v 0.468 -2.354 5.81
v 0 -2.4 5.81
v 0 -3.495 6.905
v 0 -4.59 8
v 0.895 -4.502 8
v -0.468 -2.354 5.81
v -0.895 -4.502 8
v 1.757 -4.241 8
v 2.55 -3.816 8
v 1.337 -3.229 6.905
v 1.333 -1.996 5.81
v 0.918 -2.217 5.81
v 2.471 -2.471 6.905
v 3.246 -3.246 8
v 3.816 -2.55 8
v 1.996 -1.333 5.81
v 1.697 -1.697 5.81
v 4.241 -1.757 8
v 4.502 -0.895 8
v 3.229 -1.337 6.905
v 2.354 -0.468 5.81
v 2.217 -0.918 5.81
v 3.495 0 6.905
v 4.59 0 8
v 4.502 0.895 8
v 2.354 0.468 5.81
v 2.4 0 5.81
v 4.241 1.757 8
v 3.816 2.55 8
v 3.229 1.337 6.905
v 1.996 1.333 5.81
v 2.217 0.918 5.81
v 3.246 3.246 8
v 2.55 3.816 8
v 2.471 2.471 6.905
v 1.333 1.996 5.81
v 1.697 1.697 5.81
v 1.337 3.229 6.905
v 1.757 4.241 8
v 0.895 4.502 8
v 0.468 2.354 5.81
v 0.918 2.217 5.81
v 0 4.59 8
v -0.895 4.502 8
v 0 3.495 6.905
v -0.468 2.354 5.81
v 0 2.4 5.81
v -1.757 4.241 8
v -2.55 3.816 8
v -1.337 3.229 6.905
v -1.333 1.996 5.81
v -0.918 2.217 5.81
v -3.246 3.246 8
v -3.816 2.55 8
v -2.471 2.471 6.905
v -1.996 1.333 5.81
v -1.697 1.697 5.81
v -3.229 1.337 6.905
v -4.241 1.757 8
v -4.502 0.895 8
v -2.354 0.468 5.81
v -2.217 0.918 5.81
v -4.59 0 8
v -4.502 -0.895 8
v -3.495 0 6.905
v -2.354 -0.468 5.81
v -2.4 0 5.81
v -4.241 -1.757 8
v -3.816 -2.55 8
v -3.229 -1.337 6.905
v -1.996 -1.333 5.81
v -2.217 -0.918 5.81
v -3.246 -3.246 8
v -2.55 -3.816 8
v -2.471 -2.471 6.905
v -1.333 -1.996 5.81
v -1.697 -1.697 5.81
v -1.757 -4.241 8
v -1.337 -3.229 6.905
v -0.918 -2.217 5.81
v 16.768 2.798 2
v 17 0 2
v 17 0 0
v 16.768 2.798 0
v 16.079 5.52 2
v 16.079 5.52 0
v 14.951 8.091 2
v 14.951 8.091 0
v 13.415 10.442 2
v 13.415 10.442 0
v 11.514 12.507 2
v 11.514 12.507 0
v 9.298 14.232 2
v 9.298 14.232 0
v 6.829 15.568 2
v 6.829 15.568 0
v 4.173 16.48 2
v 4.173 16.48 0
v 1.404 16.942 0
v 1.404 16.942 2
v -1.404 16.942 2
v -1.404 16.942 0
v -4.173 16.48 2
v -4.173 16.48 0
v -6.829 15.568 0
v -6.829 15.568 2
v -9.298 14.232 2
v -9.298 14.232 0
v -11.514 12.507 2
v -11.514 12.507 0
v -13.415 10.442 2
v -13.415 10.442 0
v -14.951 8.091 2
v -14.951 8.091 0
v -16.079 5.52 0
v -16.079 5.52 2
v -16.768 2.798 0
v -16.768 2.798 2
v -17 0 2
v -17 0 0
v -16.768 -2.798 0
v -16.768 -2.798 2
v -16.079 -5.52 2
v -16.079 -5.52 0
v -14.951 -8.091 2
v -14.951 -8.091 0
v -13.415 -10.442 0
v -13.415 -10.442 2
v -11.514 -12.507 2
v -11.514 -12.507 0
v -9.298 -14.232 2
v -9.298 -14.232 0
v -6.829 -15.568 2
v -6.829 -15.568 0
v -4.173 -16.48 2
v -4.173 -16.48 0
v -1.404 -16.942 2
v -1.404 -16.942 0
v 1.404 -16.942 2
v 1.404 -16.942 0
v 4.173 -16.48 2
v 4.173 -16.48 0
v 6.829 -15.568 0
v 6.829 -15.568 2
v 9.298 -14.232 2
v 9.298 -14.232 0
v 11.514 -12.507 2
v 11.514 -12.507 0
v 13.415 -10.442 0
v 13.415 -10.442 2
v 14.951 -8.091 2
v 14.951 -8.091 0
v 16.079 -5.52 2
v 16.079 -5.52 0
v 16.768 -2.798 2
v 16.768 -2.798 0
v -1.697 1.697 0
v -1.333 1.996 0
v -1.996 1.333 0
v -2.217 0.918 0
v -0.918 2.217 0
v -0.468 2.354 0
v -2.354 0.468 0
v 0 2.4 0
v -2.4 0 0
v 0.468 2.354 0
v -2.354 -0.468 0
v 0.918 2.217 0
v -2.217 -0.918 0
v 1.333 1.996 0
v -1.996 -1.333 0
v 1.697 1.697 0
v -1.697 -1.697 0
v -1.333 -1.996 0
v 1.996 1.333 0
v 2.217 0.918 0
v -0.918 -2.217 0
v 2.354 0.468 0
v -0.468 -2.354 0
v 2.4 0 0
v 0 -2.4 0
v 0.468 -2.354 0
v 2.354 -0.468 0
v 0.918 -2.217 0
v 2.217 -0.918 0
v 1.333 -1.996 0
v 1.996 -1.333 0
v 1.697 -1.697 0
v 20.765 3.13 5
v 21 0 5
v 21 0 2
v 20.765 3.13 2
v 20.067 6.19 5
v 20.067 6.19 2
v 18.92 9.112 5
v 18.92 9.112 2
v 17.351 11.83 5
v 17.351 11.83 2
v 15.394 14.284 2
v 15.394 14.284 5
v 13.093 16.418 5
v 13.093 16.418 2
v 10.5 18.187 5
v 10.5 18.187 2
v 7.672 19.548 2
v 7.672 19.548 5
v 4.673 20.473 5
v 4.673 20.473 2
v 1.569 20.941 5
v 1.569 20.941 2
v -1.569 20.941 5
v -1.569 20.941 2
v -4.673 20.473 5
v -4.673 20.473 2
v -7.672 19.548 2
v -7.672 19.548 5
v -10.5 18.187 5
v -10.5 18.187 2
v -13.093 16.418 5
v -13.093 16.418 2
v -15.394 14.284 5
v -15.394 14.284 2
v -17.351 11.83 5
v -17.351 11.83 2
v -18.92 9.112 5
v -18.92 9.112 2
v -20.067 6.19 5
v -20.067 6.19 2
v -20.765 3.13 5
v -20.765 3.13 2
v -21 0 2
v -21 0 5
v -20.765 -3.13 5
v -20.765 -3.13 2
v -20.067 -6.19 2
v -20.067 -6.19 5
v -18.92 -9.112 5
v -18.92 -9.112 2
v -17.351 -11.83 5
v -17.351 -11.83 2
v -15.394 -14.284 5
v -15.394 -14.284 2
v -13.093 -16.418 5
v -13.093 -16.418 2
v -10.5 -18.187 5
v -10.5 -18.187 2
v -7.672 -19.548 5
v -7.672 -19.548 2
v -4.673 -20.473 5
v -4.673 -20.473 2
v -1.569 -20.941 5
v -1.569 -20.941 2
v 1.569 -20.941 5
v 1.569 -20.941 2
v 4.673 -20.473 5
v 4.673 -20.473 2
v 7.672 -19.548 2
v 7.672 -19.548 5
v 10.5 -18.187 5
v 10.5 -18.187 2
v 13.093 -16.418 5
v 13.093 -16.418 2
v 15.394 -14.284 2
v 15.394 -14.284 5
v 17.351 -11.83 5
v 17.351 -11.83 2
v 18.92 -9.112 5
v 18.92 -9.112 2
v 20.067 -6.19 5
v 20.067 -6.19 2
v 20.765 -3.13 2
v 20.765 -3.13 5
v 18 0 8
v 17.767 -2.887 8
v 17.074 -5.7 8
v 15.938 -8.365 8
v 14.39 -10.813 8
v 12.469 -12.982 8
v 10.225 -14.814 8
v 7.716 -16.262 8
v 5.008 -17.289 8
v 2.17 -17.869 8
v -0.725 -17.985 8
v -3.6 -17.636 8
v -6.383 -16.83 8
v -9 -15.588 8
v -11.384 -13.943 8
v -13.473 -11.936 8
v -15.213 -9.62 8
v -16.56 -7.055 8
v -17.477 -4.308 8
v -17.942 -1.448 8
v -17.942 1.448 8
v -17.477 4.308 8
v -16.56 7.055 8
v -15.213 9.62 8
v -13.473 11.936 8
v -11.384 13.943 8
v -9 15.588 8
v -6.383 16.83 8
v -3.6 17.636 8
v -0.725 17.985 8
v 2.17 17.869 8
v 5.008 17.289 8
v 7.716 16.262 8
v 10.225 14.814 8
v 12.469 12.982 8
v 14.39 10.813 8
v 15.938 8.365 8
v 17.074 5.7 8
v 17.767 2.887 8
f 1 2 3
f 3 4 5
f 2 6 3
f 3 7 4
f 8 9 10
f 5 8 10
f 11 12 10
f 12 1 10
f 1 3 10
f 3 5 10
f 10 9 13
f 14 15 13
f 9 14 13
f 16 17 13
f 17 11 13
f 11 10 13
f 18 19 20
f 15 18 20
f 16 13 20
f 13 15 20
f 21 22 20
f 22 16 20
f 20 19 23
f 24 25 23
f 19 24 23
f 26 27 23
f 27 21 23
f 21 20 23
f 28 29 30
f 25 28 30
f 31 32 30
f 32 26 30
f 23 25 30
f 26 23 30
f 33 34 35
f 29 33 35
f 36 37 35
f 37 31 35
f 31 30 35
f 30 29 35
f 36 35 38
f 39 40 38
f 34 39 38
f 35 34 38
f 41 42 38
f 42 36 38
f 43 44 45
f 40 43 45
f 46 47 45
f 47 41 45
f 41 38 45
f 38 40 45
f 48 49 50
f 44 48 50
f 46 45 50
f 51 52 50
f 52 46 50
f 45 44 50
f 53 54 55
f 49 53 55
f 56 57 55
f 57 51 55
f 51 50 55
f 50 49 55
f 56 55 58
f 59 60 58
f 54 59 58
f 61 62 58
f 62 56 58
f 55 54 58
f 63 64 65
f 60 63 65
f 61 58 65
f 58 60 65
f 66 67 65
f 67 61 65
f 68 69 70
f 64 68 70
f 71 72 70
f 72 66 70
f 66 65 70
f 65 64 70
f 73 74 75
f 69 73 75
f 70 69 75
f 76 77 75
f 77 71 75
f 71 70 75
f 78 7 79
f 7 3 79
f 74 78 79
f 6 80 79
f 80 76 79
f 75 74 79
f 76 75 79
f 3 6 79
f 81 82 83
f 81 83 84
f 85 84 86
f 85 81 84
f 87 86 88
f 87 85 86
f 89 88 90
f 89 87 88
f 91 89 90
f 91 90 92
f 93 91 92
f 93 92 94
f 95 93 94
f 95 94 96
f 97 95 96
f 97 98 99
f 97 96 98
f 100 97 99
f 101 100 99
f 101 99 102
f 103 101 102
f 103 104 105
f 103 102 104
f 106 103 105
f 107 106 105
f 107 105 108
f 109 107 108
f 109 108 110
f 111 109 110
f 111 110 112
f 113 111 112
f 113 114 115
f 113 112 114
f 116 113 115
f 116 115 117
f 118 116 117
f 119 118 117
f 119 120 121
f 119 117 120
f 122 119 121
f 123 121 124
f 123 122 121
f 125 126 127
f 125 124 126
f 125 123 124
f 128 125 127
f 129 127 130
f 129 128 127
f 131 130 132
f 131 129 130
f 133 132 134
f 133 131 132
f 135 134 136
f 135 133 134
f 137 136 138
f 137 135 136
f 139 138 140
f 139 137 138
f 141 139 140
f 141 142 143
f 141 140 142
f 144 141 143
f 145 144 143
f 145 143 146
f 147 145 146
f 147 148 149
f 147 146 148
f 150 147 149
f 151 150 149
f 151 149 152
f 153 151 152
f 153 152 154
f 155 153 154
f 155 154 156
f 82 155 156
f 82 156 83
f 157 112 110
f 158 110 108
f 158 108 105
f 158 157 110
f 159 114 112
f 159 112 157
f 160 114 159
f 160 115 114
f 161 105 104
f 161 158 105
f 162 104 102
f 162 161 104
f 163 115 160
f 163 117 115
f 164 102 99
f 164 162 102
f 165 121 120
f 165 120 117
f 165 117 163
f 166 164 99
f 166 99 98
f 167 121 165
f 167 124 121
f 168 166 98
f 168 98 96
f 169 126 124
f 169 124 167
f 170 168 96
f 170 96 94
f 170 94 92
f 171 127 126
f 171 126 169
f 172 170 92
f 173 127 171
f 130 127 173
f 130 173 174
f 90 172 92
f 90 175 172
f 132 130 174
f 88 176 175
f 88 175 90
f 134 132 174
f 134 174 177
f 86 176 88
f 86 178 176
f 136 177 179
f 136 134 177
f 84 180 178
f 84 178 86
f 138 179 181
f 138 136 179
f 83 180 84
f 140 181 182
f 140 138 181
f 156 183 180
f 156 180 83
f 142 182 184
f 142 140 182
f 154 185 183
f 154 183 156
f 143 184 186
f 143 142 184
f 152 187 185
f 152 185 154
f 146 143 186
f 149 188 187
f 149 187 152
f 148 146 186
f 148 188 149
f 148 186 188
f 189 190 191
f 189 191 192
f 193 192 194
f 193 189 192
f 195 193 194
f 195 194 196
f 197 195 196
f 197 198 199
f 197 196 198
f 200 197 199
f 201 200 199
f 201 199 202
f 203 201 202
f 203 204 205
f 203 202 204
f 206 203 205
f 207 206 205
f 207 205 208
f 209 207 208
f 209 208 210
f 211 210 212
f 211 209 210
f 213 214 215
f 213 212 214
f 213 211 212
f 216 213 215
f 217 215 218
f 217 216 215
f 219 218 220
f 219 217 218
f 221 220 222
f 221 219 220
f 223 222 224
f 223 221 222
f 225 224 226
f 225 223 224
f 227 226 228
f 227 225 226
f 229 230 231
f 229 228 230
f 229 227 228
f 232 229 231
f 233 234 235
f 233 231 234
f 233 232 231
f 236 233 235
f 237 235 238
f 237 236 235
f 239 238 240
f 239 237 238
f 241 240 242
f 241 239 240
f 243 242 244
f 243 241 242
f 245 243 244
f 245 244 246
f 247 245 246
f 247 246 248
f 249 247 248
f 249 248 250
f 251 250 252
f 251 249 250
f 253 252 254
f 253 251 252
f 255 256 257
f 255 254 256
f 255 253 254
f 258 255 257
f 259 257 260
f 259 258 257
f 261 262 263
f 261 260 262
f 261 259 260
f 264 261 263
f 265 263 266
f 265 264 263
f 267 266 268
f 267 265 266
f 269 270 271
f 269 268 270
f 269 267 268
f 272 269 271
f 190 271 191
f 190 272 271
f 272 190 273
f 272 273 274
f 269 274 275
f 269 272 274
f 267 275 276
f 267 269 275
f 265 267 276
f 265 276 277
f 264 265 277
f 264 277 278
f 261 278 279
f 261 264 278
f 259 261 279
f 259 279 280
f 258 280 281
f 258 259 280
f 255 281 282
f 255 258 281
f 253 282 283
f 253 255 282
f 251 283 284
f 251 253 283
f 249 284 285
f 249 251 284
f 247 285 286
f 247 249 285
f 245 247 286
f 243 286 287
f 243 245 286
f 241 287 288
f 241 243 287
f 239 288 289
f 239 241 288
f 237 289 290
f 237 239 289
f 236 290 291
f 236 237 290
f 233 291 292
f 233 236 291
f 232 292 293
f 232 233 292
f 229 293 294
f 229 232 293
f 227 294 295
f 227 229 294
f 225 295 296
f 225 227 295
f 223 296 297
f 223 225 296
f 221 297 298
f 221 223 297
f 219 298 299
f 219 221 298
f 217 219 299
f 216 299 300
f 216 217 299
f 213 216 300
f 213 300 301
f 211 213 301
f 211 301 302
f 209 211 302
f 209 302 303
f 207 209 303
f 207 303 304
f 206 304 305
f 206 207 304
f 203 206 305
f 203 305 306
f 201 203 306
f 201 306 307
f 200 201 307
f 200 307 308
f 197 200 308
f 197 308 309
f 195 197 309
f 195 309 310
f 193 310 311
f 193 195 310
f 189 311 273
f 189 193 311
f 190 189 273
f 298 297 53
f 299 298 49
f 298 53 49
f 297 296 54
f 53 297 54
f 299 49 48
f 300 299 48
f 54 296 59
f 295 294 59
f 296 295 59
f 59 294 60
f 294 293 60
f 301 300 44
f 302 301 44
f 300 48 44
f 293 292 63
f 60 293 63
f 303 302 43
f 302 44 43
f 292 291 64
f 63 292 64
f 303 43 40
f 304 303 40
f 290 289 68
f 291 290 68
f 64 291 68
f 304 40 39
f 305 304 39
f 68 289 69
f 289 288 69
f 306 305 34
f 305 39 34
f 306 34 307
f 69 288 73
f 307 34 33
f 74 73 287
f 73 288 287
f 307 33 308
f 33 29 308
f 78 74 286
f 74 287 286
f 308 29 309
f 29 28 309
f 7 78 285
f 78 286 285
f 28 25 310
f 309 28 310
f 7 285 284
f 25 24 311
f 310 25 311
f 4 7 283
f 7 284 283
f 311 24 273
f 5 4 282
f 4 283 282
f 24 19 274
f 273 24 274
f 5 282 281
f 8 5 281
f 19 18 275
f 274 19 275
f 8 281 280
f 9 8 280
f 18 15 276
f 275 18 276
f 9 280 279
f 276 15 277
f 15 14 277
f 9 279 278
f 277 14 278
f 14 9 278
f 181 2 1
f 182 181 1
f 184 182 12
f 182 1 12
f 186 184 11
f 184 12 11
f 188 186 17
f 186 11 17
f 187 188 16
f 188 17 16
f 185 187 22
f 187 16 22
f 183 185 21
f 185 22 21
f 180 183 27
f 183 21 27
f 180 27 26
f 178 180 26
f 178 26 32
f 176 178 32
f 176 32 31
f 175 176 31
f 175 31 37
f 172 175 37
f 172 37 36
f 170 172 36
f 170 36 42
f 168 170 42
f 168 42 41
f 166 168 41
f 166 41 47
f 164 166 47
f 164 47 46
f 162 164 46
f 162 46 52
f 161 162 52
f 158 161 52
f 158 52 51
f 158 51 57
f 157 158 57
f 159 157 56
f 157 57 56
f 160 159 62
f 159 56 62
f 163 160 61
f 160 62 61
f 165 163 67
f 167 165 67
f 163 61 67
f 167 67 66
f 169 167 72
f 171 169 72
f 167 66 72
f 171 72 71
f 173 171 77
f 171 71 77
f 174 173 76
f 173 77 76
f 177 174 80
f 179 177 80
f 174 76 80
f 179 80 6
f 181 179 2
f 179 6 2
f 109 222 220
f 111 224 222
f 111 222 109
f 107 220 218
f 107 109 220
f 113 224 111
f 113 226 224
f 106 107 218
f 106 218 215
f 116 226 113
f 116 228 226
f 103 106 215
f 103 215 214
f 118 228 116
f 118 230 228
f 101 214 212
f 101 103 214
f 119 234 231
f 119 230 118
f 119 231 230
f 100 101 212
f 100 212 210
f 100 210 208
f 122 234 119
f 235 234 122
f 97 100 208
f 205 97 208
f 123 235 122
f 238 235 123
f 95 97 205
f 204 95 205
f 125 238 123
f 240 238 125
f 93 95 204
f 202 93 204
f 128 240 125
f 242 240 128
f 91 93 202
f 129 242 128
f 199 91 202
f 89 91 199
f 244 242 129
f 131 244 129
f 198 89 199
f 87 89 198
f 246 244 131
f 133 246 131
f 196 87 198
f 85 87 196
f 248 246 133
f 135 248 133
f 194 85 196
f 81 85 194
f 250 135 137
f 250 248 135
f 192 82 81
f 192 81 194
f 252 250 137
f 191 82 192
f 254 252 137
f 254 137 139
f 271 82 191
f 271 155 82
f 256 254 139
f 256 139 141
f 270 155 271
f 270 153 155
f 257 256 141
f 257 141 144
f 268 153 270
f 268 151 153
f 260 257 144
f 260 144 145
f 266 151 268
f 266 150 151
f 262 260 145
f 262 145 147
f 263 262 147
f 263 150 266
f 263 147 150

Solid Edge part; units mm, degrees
sketch "Sketch1" plane through (0, 0, 0) normal (0, -1, 0) x (1, 0, 0)
  line L0 (0, 0) -> (17, 0)
  line L1 (17, 0) -> (17, 2)
  line L2 (17, 2) -> (21, 2)
  line L3 (21, 2) -> (21, 8)
  line L4 (21, 8) -> (0, 8)
  dimension "D1" = 8
  dimension "D2" = 6
revolve "RevolvedProtrusion1" add sketch "Sketch1" angle 360 about axis through (0, 0, 10) along (0, 0, -1)
chamfer "Chamfer1" distance 3 angle 45 1 edges at (-21, 0, 8)
hole "Hole_1" at (0, 0, 8) direction (0, 0, -1) diameter 4.8 end up to next countersink diameter 9.18 countersink angle 90
properties material "Polyethylene, low density"
